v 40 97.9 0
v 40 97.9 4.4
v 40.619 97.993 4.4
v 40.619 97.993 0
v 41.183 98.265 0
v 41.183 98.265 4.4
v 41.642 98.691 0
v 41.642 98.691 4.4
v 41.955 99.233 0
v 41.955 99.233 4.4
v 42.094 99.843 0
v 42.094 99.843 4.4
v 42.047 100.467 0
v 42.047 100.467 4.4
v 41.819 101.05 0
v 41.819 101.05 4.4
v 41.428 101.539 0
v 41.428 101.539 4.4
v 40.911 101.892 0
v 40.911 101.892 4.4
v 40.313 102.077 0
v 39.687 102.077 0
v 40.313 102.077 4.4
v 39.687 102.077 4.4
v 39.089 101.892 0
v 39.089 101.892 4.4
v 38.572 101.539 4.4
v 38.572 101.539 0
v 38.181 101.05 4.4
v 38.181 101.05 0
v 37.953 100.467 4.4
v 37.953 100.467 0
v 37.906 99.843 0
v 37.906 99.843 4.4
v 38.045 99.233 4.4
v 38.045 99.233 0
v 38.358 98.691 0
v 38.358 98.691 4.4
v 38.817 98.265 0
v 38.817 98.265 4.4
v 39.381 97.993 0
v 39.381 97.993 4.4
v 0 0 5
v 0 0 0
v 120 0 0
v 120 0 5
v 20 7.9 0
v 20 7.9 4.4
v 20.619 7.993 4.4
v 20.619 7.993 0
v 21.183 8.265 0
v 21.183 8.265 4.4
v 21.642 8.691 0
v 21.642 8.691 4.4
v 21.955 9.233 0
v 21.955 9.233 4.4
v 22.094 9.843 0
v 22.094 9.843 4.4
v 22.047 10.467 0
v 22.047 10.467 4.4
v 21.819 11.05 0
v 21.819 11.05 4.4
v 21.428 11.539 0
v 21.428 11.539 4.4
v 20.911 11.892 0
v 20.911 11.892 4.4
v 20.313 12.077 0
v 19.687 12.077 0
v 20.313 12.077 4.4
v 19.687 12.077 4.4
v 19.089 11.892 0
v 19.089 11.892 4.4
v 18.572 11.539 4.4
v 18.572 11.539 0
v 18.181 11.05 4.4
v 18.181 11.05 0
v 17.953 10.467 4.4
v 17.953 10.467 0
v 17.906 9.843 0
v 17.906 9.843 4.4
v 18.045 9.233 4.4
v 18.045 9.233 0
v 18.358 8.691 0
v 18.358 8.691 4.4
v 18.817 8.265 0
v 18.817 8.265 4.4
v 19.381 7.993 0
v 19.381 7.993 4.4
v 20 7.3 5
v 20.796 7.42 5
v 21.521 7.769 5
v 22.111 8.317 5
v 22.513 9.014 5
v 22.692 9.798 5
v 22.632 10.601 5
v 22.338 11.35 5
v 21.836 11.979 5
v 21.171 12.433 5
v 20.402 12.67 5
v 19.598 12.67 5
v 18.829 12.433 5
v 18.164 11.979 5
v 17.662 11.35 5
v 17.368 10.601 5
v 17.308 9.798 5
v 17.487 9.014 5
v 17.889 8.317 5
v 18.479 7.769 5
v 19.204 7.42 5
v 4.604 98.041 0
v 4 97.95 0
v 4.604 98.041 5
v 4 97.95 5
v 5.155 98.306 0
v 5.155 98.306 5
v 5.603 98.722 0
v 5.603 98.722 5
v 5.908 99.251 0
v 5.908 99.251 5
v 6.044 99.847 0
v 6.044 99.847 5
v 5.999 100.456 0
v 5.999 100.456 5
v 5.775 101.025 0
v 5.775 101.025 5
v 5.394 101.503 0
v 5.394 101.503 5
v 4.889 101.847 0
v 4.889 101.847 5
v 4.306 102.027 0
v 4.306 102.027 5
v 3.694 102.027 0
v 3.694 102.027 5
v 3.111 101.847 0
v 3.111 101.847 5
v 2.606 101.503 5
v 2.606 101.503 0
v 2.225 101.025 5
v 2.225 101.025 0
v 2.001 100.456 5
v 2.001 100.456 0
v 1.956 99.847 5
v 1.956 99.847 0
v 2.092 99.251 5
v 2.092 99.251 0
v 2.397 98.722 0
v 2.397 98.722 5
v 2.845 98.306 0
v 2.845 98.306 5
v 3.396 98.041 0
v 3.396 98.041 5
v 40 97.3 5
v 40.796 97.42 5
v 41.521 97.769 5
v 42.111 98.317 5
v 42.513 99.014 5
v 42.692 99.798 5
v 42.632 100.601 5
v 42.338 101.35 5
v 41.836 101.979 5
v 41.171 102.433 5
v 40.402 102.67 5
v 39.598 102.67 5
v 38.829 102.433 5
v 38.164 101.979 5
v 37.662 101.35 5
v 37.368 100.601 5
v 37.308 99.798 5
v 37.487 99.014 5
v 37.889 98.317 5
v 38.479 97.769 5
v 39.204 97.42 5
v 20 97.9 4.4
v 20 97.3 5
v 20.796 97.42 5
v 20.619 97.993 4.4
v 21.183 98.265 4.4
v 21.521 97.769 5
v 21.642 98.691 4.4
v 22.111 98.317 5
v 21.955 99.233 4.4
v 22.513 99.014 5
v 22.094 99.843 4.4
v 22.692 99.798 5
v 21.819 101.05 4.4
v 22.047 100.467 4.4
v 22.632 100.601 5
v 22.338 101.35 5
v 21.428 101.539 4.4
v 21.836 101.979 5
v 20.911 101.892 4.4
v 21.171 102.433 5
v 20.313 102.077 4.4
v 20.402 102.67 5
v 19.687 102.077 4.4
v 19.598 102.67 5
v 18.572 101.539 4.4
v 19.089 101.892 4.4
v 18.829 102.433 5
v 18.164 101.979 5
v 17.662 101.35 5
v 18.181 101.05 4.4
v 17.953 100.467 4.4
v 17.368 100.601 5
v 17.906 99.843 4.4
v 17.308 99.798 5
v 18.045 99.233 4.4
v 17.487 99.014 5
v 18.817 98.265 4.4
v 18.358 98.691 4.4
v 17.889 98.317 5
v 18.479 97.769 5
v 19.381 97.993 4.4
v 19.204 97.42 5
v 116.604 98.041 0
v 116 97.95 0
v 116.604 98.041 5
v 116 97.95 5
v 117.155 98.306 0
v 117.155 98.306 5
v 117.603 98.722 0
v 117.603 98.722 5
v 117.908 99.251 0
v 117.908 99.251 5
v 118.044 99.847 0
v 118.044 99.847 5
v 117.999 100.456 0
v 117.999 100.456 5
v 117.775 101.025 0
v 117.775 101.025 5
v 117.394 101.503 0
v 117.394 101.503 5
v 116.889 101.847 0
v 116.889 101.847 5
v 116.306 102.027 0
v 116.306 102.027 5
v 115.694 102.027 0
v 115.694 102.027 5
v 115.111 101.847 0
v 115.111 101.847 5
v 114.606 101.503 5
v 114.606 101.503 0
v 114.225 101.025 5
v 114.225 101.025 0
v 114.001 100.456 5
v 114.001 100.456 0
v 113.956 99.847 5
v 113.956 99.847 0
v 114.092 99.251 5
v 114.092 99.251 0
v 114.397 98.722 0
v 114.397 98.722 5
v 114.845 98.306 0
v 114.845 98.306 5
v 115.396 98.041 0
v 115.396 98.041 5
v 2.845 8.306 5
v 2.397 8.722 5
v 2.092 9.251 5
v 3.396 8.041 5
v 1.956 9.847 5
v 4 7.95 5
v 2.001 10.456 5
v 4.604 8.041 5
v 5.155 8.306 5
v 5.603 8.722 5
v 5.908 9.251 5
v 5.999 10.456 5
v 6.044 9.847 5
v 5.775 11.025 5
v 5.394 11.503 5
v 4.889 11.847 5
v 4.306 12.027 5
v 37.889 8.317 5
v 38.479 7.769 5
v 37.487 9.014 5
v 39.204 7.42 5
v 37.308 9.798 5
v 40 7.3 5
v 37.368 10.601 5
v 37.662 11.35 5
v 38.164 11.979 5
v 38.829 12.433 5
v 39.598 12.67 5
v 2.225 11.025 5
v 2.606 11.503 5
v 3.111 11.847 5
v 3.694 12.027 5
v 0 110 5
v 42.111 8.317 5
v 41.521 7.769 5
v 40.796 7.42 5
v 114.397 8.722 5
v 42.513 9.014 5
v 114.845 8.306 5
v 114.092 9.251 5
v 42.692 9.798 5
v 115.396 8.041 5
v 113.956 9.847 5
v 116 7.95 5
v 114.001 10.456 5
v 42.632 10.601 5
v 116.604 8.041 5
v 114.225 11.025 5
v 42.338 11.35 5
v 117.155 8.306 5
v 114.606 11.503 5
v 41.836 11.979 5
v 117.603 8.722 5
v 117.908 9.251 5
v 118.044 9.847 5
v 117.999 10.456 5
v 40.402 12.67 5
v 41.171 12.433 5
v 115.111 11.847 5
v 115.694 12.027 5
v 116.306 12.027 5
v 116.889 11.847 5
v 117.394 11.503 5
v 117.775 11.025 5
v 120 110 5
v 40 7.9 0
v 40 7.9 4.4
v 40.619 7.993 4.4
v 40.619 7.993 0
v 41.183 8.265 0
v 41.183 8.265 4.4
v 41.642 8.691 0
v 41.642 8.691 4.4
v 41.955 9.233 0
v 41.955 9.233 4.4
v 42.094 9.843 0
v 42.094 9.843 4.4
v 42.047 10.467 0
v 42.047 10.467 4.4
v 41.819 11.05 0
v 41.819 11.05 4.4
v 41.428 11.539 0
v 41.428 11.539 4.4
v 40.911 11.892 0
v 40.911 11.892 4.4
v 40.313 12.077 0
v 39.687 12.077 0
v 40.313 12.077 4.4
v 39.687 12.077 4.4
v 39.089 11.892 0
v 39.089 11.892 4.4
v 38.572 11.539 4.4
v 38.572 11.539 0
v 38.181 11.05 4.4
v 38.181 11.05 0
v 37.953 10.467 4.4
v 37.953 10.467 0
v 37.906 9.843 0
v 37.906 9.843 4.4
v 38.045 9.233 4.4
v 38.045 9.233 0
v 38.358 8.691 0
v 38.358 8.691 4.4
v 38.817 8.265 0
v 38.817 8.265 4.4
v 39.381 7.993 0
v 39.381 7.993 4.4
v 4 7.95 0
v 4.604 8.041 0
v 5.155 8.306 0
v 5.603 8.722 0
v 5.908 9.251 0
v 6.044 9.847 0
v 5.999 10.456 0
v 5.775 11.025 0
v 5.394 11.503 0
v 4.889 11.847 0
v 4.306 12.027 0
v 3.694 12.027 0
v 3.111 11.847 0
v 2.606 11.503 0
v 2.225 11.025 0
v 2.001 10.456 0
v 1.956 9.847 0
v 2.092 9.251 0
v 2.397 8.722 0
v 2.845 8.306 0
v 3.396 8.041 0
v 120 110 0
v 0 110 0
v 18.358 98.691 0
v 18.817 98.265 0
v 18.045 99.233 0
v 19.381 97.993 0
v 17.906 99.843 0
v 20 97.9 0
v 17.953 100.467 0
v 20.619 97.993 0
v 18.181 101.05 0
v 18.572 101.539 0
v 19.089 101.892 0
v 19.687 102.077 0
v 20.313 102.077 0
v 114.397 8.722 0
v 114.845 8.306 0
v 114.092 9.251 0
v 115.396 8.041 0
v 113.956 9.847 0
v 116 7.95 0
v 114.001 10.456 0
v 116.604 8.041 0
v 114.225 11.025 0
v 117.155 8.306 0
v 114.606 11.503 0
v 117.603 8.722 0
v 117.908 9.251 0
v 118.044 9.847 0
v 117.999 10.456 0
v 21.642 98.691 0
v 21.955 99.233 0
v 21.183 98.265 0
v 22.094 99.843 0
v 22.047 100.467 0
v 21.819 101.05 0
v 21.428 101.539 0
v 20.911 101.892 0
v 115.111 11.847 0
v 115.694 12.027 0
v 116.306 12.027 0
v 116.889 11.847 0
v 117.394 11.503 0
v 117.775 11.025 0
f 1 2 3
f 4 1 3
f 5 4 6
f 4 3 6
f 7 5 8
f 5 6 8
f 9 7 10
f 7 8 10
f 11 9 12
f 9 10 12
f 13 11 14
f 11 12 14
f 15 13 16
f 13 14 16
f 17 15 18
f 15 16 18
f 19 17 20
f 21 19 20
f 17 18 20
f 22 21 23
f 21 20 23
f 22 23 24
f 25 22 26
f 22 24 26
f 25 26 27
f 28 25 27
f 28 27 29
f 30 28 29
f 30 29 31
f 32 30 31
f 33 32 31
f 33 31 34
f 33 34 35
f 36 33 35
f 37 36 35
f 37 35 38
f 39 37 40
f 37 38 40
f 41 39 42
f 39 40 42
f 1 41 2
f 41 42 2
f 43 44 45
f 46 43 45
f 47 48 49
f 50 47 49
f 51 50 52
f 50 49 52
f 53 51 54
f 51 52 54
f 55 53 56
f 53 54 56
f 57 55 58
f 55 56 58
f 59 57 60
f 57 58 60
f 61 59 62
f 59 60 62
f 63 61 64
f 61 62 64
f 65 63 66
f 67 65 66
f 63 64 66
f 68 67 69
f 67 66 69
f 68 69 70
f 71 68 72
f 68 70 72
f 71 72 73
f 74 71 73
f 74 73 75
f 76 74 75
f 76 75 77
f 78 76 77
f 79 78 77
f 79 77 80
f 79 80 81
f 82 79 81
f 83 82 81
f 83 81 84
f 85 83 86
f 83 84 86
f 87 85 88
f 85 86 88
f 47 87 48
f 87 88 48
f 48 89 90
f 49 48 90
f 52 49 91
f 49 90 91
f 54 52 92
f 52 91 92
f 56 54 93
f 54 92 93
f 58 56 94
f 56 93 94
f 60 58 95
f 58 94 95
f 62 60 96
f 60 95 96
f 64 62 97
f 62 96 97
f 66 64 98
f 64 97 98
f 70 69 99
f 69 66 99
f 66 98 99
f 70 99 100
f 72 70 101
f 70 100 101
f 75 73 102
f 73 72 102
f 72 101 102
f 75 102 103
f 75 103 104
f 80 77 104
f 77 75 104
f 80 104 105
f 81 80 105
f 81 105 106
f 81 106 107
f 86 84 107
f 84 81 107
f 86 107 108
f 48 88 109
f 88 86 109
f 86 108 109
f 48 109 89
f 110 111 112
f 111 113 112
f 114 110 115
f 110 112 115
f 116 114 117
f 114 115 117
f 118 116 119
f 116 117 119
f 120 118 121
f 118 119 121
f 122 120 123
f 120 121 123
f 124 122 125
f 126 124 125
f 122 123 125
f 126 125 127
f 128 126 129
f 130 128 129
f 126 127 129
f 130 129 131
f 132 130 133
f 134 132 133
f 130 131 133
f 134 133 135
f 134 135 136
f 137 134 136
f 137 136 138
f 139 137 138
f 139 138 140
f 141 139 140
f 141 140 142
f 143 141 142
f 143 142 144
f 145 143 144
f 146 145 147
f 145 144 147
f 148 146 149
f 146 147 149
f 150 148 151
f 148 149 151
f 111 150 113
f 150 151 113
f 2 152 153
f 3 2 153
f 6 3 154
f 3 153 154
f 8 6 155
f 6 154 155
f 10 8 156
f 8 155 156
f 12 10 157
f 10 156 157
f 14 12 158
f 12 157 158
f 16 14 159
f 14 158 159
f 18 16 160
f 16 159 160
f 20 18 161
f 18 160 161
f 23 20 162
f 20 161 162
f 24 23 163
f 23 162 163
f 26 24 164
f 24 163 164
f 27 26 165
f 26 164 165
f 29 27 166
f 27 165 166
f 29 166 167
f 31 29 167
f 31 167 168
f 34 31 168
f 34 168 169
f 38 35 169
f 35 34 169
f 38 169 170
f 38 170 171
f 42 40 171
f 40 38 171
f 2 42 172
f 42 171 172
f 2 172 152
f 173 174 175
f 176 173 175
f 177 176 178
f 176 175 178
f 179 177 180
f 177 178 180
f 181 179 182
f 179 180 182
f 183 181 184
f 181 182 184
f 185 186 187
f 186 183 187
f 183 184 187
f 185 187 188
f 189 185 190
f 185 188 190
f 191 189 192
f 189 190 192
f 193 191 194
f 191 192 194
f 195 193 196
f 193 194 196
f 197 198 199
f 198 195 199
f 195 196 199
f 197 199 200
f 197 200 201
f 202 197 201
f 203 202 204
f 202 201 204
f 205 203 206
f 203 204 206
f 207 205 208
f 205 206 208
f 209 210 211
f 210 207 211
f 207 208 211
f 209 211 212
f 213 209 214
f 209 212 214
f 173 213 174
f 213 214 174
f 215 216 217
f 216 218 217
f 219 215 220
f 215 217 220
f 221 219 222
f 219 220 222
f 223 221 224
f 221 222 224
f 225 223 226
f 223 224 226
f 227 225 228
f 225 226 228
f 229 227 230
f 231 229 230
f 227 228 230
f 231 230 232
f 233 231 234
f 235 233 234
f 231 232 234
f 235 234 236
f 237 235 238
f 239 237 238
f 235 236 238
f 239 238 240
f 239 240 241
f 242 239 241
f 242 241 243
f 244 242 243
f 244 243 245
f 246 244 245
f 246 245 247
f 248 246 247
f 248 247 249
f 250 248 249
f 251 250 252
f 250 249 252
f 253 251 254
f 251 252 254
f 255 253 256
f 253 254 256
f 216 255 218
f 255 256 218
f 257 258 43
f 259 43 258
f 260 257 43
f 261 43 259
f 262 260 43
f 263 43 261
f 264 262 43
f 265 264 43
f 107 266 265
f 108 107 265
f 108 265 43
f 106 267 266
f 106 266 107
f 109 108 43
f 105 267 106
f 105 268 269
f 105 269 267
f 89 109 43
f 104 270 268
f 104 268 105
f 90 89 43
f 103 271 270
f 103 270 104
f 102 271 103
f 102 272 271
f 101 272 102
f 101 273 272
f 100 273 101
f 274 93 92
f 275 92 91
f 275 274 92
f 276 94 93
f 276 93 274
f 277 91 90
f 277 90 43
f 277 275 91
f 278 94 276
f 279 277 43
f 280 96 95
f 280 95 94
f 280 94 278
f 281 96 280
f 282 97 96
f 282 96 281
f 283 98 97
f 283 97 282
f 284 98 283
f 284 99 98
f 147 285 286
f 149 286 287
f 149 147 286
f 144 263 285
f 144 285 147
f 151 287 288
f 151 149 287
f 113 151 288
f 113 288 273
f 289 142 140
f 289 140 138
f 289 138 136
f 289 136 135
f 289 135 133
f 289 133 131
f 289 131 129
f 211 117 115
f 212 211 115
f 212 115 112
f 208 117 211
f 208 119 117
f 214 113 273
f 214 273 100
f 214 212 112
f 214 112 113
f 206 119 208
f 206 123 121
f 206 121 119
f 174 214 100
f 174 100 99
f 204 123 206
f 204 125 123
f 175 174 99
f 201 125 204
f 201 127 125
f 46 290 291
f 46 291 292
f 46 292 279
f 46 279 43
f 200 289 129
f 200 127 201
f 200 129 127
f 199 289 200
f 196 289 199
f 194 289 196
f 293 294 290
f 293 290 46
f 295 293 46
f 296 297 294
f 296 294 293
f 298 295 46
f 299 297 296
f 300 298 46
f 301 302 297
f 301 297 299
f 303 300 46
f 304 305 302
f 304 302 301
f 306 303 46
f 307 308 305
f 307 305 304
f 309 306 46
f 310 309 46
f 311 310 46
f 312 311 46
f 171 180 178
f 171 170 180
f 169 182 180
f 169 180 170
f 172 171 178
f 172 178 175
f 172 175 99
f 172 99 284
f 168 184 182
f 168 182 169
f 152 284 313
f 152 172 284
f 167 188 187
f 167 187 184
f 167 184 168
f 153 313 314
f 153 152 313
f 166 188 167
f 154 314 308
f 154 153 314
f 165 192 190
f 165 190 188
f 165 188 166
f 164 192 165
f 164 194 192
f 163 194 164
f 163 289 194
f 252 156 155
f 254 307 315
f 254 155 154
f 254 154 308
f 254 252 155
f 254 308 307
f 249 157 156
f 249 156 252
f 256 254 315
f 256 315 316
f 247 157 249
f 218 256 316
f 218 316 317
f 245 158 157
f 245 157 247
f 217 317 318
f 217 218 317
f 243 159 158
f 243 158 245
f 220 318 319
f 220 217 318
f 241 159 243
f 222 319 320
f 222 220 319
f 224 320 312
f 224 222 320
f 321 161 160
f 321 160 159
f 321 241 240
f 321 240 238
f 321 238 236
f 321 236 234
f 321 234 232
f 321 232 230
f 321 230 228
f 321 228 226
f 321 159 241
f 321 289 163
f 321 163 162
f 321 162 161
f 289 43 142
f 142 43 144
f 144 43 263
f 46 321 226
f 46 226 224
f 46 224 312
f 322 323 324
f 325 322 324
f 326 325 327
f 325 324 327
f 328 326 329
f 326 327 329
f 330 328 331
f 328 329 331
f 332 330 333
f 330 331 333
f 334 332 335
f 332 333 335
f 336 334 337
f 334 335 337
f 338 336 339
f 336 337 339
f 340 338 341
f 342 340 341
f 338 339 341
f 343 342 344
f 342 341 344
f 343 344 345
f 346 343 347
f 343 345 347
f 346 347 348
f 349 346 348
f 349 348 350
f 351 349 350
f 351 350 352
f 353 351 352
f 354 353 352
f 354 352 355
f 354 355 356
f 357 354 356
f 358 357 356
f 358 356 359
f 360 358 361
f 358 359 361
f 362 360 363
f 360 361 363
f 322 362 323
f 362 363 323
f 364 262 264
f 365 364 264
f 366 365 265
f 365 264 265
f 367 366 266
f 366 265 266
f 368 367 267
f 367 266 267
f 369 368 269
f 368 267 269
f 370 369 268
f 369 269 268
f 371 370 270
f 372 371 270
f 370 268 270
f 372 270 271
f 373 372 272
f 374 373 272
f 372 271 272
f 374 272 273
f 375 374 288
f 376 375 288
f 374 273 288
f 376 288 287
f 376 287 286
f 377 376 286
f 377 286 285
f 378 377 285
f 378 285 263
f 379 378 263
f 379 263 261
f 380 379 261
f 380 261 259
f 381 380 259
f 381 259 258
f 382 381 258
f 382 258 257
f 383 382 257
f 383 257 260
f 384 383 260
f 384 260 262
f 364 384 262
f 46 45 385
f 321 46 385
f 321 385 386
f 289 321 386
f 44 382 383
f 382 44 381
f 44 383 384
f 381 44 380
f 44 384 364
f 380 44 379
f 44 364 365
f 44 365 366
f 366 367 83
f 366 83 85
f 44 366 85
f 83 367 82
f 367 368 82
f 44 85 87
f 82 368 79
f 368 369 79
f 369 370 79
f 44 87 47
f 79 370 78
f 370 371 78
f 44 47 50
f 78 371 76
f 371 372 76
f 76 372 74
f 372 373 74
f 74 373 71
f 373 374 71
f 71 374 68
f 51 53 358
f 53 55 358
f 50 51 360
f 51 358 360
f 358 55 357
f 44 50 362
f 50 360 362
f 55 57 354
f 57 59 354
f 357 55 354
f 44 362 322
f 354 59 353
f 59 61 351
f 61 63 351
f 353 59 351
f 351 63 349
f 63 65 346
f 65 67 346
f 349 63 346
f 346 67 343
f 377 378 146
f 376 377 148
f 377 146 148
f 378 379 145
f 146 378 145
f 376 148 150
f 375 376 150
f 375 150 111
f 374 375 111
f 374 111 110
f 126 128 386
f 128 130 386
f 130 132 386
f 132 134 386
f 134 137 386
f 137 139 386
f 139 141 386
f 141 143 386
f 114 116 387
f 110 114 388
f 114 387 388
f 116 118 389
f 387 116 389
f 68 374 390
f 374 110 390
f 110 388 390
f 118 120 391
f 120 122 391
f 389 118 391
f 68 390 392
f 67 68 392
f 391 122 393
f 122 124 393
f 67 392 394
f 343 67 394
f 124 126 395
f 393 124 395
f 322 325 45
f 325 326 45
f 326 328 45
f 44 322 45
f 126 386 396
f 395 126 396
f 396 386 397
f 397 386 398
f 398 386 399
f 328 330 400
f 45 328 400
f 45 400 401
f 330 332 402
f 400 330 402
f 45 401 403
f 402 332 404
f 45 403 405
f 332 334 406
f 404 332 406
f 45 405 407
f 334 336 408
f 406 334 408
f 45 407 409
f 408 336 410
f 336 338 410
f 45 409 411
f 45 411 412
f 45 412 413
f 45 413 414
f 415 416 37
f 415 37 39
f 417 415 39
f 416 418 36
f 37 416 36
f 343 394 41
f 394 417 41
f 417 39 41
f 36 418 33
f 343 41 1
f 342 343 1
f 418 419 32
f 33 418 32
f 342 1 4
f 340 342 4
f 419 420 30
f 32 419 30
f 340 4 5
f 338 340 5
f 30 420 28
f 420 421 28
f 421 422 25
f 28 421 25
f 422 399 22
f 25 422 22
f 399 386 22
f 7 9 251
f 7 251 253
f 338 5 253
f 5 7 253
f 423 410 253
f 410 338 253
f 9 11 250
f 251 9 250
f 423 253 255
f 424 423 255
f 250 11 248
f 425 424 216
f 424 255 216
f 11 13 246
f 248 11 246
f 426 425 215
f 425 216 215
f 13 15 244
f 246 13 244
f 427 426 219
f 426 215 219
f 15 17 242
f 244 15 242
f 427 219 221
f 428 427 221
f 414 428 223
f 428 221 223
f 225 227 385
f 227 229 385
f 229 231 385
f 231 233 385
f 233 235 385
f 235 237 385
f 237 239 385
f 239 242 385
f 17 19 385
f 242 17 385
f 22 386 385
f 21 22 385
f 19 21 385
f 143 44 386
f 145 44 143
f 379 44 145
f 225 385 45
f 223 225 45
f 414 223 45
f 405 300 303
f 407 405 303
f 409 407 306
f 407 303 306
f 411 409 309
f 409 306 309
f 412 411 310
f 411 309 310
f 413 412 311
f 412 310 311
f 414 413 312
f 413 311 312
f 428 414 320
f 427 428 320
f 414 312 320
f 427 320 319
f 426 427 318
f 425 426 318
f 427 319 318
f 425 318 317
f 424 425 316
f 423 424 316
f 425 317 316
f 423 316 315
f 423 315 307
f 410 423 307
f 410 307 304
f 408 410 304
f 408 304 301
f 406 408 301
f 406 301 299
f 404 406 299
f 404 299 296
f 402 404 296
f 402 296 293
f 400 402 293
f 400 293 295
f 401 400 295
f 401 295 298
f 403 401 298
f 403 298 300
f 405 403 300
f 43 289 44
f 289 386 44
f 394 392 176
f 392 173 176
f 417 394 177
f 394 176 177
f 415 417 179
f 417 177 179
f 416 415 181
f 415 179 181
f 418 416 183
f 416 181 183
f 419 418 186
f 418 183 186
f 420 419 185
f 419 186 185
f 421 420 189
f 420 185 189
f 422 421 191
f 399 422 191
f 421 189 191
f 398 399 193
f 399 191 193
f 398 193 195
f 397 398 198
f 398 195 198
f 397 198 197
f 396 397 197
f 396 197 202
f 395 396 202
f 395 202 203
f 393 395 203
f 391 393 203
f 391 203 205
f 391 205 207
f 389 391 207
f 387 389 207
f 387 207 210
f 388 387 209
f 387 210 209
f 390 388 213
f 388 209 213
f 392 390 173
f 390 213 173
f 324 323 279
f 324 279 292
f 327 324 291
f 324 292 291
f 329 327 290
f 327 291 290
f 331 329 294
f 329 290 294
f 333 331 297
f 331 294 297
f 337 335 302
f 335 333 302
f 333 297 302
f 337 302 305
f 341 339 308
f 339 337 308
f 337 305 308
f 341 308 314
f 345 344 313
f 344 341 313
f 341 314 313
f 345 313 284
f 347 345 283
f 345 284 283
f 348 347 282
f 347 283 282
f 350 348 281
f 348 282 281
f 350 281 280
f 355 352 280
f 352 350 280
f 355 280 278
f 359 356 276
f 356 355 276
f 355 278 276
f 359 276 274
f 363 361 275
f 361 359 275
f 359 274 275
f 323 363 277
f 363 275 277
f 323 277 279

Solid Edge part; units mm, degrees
sketch "Sketch1" plane through (0, 0, 0) normal (0, 0, 1) x (1, 0, 0)
  line L0 (120, 110) -> (0, 110)
  line L1 (0, 110) -> (0, 0)
  line L2 (0, 0) -> (120, 0)
  line L3 (120, 0) -> (120, 110)
extrude "Protrusion1" add sketch "Sketch1" along normal blind 5
sketch "Sketch2" plane through (60, 20, 5) normal (0, 0, 1) x (1, 0, 0)
  line L0 (55, -20) -> (55, 90)
  line L1 (55, 90) -> (60, 90)
  line L2 (60, 90) -> (60, -20)
  line L3 (60, -20) -> (55, -20)
  line L4 (-55, 90) -> (-55, -20)
  line L5 (-55, -20) -> (-60, -20)
  line L6 (-60, -20) -> (-60, 90)
  line L7 (-60, 90) -> (-55, 90)
  dimension "D1" = 5
extrude "Extrusionsausprägung_2" add sketch "Sketch2" along normal blind 80
hole "Bohrung_1" at (120, 20, 45) direction (-1, 0, 0) diameter 19 end up to next
hole "Hole_2" at (20, 10, 5) direction (0, 0, -1) diameter 4.2 end up to next start chamfer 0.6 start chamfer angle 45
hole "Hole1" at (20, 100, 5) direction (0, 0, -1) diameter 4.2 end up to next start chamfer 0.6 start chamfer angle 45
hole "Hole2" at (40, 100, 5) direction (0, 0, -1) diameter 4.2 end up to next start chamfer 0.6 start chamfer angle 45
hole "Hole3" at (40, 10, 5) direction (0, 0, -1) diameter 4.2 end up to next start chamfer 0.6 start chamfer angle 45
hole "Hole4" at (0, 20, 45) direction (1, 0, 0) diameter 8 end up to next
hole "Hole5" at (120, 65, 45) direction (-1, 0, 0) diameter 8 end up to next
sketch "Sketch3" plane through (60, 0, 42.5) normal (0, -1, 0) x (1, 0, 0)
  line L0 (55, -37.5) -> (55, 42.5)
  line L1 (55, 42.5) -> (60, 42.5)
  line L2 (60, 42.5) -> (60, -37.5)
  line L3 (60, -37.5) -> (55, -37.5)
  line L4 (-55, -37.5) -> (-60, -37.5)
  line L5 (-60, -37.5) -> (-60, 42.5)
  line L6 (-60, 42.5) -> (-55, 42.5)
  line L7 (-55, 42.5) -> (-55, -37.5)
extrude "Cutout1" cut sketch "Sketch3" against normal up to next
hole "Hole6" at (4, 10, 5) direction (0, 0, -1) diameter 4.1 end up to next
hole "Hole7" at (116, 10, 5) direction (0, 0, -1) diameter 4.1 end up to next
hole "Hole8" at (116, 100, 5) direction (0, 0, -1) diameter 4.1 end up to next
hole "Hole9" at (4, 100, 5) direction (0, 0, -1) diameter 4.1 end up to next
